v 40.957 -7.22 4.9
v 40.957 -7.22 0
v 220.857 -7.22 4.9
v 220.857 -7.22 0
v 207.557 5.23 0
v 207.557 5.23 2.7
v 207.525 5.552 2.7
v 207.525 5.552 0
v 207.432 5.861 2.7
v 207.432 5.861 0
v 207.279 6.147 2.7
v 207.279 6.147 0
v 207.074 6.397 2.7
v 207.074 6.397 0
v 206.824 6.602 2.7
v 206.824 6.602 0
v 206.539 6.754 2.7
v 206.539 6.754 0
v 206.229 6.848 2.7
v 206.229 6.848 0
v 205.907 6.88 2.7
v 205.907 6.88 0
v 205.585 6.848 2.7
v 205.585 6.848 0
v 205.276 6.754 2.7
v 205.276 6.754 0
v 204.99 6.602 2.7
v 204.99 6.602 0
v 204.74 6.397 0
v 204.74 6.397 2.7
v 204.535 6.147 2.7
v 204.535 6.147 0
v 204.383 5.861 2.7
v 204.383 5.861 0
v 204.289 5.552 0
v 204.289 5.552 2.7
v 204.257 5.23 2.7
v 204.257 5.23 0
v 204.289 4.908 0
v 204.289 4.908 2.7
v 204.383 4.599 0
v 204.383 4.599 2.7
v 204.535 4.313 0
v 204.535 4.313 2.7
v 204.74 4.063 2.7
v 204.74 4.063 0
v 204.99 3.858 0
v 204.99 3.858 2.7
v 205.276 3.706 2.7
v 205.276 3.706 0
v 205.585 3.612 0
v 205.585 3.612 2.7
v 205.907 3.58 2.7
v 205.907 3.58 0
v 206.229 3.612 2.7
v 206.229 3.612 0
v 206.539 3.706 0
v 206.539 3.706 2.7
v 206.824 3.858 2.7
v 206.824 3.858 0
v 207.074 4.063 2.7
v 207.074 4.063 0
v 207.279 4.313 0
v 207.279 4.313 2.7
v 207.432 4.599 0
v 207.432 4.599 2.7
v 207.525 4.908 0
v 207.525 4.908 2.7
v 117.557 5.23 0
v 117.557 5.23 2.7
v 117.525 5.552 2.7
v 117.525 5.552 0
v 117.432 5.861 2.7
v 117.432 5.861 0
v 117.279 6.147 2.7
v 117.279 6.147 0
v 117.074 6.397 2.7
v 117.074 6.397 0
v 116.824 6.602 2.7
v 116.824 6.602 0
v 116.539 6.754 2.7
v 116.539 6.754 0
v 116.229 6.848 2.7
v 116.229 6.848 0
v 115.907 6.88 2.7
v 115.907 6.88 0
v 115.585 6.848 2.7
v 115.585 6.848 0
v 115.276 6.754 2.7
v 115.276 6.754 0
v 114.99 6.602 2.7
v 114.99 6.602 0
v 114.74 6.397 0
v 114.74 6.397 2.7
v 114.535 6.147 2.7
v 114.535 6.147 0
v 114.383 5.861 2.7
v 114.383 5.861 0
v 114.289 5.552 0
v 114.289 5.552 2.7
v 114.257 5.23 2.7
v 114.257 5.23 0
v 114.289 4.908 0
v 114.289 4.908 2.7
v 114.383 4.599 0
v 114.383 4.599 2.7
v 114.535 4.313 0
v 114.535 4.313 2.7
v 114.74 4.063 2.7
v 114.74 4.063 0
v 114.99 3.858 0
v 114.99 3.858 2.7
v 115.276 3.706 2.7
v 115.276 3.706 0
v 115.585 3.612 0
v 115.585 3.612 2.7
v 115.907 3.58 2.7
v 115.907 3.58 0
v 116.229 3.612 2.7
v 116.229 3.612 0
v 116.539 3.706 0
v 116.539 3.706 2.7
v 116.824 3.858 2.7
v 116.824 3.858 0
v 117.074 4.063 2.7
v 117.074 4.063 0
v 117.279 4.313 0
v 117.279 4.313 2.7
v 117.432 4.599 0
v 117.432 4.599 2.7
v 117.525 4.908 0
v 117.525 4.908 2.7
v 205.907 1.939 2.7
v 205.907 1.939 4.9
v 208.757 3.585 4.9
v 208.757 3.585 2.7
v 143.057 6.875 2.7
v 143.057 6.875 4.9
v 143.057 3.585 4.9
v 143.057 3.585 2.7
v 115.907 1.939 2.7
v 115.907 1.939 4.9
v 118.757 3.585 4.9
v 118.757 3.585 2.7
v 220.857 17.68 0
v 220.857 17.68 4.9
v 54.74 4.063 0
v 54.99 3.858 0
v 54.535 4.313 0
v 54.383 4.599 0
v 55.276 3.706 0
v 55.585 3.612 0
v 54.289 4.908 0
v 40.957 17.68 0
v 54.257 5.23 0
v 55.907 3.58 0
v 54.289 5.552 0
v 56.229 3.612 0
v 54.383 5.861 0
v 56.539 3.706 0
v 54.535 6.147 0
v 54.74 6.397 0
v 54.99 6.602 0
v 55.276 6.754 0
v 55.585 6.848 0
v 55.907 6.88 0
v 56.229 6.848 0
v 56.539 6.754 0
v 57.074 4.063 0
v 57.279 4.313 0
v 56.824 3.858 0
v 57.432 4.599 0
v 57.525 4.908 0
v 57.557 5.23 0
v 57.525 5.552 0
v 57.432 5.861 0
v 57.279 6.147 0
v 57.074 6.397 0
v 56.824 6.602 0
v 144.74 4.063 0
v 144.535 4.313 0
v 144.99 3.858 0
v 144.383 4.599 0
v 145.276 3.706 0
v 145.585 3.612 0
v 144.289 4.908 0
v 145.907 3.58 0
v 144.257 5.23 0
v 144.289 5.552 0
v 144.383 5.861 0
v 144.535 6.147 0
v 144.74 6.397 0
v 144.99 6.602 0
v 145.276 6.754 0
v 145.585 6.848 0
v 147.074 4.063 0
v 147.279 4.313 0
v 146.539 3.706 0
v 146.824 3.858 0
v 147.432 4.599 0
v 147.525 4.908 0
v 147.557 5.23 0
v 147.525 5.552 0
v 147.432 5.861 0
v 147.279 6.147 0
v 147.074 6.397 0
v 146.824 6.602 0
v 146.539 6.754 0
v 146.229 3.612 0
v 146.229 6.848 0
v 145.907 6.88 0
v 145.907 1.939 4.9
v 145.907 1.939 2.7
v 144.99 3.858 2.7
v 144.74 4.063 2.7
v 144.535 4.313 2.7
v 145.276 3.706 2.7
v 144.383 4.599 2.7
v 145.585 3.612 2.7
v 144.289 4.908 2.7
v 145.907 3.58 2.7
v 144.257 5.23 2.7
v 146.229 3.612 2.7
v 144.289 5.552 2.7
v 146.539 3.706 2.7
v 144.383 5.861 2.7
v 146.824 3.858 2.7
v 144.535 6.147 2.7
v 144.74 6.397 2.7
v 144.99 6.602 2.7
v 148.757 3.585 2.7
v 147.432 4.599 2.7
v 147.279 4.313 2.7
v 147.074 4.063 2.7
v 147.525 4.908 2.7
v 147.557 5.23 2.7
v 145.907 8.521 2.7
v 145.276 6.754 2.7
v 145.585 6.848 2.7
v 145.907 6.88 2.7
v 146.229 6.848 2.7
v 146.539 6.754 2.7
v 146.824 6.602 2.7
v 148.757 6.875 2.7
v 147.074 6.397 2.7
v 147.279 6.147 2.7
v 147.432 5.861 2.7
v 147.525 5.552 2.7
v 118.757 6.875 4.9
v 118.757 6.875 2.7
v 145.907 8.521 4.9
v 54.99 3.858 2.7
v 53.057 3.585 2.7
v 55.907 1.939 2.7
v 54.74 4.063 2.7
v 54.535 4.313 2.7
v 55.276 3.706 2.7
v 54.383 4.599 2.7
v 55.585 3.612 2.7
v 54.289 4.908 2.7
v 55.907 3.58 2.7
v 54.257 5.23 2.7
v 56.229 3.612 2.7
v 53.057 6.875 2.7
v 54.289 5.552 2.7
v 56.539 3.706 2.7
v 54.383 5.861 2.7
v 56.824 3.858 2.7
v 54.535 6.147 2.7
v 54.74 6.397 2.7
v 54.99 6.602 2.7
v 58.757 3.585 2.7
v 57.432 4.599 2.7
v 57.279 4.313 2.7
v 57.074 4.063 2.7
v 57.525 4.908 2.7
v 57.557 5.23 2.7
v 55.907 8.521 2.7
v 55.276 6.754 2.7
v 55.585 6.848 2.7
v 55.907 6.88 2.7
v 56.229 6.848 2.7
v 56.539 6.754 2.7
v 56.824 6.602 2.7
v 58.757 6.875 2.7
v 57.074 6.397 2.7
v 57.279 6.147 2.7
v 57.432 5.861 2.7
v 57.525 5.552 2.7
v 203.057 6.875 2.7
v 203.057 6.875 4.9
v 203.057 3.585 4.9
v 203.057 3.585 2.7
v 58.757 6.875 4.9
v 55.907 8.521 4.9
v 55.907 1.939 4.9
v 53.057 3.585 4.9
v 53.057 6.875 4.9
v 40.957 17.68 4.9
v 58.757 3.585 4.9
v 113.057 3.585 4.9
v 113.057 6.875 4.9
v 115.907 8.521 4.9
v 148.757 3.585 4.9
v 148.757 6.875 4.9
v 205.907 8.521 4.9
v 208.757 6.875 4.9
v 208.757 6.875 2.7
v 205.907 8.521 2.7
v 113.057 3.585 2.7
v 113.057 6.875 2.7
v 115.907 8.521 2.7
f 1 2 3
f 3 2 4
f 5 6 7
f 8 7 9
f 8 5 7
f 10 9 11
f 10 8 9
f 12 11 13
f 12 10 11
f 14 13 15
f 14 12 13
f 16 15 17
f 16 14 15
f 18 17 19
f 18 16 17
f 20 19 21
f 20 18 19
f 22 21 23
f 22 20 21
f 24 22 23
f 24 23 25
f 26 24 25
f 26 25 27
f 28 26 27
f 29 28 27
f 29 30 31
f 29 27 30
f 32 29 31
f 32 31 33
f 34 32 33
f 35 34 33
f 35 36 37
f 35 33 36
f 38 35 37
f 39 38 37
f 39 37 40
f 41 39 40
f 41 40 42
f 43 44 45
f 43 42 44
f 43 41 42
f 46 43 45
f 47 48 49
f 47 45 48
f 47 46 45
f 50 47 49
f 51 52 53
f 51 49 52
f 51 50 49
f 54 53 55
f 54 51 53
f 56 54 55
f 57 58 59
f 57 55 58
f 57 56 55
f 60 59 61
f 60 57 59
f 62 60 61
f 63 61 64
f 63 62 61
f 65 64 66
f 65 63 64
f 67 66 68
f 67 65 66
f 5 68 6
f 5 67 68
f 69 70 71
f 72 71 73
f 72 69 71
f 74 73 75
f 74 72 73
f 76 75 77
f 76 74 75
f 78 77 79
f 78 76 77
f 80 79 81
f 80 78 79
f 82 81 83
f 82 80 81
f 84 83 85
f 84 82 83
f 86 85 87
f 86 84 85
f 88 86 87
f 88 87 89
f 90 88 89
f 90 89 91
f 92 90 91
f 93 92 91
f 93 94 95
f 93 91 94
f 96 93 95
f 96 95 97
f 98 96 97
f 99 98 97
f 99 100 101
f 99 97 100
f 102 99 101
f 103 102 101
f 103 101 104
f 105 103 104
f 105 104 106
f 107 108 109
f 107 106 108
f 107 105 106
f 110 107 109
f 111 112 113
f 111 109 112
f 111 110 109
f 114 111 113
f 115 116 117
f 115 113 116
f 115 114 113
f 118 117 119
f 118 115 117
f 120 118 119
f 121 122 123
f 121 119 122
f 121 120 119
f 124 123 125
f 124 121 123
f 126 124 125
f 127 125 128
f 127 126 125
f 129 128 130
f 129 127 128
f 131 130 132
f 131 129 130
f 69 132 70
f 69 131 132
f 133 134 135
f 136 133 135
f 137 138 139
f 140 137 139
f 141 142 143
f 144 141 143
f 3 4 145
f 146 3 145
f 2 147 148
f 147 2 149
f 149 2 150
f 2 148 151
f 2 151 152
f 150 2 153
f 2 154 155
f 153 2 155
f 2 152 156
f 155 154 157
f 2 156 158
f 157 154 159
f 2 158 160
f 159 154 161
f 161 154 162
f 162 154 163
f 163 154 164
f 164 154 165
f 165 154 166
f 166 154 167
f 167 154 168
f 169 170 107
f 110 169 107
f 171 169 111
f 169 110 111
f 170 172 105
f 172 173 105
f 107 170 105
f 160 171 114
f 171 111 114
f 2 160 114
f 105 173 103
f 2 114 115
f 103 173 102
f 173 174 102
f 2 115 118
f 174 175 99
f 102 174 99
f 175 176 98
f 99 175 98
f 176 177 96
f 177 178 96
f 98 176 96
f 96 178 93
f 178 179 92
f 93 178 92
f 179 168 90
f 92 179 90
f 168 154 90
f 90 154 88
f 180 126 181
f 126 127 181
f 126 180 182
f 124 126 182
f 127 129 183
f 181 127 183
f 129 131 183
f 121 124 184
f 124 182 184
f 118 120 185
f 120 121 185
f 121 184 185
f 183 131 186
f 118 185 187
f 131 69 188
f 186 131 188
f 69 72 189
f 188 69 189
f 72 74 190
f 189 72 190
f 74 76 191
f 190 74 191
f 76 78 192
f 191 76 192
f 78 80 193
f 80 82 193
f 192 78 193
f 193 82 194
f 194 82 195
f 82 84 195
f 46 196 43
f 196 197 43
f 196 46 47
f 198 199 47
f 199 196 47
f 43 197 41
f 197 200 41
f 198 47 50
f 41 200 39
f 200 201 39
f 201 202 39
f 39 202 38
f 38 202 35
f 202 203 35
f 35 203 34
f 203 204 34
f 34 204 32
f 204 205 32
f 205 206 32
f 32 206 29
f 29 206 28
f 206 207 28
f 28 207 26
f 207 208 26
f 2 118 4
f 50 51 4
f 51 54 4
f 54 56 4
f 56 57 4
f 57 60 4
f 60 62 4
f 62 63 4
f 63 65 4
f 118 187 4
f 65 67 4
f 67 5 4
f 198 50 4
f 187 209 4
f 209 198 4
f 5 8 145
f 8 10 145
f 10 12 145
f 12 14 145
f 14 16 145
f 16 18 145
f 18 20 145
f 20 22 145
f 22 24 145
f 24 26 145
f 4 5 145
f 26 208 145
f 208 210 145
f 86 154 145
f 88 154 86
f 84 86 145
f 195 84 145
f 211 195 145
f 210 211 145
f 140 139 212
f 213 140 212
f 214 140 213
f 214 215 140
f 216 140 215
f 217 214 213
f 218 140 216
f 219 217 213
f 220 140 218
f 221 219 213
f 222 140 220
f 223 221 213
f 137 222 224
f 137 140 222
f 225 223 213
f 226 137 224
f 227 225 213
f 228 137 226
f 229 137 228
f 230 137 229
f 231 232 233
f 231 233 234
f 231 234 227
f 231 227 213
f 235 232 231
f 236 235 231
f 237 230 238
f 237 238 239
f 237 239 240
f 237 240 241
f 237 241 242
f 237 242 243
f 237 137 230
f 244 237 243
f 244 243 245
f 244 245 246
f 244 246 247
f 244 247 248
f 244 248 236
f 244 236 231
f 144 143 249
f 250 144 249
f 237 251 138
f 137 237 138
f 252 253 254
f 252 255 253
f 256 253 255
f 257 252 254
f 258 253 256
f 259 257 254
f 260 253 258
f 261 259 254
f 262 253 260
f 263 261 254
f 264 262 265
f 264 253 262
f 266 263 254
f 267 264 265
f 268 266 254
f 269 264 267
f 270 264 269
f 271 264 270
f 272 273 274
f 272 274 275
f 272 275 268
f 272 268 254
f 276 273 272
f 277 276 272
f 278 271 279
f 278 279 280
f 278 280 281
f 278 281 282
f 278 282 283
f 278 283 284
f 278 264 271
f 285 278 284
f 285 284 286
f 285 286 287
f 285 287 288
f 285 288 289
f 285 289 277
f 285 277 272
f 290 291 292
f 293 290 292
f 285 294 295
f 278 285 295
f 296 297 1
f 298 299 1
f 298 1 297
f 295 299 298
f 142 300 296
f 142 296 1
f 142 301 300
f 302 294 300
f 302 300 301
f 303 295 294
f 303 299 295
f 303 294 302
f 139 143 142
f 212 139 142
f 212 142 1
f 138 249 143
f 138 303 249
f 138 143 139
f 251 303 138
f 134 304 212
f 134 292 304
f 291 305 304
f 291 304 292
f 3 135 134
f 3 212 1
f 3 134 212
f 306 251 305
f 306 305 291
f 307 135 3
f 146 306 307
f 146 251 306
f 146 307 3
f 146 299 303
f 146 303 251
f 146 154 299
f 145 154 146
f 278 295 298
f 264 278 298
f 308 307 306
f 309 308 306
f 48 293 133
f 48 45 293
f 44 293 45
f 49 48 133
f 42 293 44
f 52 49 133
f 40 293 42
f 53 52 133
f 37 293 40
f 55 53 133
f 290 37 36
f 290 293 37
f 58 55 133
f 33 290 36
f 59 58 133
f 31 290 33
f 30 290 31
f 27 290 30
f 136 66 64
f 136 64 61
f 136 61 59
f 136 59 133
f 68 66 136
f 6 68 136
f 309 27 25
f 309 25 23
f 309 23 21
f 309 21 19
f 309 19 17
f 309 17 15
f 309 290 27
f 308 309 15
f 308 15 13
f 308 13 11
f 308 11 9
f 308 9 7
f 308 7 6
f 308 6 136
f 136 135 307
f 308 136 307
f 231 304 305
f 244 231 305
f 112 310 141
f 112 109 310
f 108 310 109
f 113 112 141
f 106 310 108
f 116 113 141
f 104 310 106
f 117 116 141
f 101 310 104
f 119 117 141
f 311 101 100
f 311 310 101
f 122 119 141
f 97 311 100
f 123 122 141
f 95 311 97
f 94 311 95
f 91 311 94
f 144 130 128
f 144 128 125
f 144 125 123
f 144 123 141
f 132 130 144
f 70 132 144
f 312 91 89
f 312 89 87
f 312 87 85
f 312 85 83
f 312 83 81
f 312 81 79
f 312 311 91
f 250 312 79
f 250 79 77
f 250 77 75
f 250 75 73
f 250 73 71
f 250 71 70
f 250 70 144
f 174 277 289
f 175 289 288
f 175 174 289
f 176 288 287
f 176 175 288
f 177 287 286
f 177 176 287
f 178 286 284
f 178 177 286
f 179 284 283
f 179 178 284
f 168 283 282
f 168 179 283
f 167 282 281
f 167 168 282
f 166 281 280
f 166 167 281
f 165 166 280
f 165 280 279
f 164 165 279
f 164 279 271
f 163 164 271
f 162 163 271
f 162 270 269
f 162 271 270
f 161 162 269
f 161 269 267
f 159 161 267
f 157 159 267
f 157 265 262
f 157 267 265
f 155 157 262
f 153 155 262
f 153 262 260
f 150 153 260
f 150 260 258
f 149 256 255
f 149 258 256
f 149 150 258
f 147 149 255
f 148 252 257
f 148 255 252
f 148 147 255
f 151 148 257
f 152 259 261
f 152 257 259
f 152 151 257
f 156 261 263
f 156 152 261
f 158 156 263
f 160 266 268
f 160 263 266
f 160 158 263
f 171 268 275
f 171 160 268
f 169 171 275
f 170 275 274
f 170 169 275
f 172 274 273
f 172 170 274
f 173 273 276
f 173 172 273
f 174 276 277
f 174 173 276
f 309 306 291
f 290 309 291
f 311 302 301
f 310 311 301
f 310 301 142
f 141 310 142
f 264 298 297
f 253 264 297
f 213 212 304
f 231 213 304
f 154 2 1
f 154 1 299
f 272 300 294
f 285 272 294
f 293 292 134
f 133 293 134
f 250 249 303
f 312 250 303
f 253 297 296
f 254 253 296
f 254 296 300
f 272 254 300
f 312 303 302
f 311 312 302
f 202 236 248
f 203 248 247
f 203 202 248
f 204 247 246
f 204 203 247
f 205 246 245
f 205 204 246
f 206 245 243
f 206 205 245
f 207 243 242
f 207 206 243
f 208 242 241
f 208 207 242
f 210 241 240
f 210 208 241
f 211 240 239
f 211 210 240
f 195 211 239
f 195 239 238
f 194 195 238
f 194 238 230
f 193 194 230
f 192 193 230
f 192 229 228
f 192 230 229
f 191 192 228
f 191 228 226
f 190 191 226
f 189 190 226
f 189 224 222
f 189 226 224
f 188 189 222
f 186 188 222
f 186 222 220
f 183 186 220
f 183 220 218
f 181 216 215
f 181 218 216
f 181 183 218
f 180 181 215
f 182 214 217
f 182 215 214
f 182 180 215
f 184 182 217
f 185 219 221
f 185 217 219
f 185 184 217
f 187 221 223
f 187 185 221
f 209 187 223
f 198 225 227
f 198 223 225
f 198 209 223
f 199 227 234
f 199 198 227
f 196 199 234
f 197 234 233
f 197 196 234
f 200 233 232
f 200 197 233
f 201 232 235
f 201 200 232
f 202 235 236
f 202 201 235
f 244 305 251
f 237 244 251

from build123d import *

# Parameters (mm, degrees)
SKETCH1_W           = 179.9
SKETCH1_H           = 24.9
SKETCH1_R           = 1.65
BOSS_EXTRUDE1_DEPTH = 4.9
CUT_EXTRUDE1_DEPTH  = 2.2


with BuildPart() as part:
    # Sketch1 → Boss-Extrude1 (new body)
    with BuildSketch(Plane.XY):
        with Locations((130.907132516, 5.230027325)):
            Rectangle(SKETCH1_W, SKETCH1_H)
        with Locations((205.907132516, 5.230027325)):
            Circle(SKETCH1_R, mode=Mode.SUBTRACT)
        with Locations((145.907132516, 5.230027325)):
            Circle(SKETCH1_R, mode=Mode.SUBTRACT)
        with Locations((115.907132516, 5.230027325)):
            Circle(SKETCH1_R, mode=Mode.SUBTRACT)
        with Locations((55.907132516, 5.230027325)):
            Circle(SKETCH1_R, mode=Mode.SUBTRACT)
    extrude(amount=BOSS_EXTRUDE1_DEPTH)

    # Sketch2 → Cut-Extrude1 (cut)
    with BuildSketch(Plane.XY.offset(4.9)):
        Polygon((58.757132516, 3.584579057), (58.757132516, 6.875475592), (55.907132516, 8.520923859), (53.057132516, 6.875475592), (53.057132516, 3.584579057), (55.907132516, 1.93913079), align=None)
        Polygon((118.757132516, 3.584579057), (118.757132516, 6.875475592), (115.907132516, 8.520923859), (113.057132516, 6.875475592), (113.057132516, 3.584579057), (115.907132516, 1.93913079), align=None)
        Polygon((148.757132516, 3.584579057), (148.757132516, 6.875475592), (145.907132516, 8.520923859), (143.057132516, 6.875475592), (143.057132516, 3.584579057), (145.907132516, 1.93913079), align=None)
        Polygon((208.757132516, 3.584579057), (208.757132516, 6.875475592), (205.907132516, 8.520923859), (203.057132516, 6.875475592), (203.057132516, 3.584579057), (205.907132516, 1.93913079), align=None)
    extrude(amount=-CUT_EXTRUDE1_DEPTH, mode=Mode.SUBTRACT)


solid = part.part
